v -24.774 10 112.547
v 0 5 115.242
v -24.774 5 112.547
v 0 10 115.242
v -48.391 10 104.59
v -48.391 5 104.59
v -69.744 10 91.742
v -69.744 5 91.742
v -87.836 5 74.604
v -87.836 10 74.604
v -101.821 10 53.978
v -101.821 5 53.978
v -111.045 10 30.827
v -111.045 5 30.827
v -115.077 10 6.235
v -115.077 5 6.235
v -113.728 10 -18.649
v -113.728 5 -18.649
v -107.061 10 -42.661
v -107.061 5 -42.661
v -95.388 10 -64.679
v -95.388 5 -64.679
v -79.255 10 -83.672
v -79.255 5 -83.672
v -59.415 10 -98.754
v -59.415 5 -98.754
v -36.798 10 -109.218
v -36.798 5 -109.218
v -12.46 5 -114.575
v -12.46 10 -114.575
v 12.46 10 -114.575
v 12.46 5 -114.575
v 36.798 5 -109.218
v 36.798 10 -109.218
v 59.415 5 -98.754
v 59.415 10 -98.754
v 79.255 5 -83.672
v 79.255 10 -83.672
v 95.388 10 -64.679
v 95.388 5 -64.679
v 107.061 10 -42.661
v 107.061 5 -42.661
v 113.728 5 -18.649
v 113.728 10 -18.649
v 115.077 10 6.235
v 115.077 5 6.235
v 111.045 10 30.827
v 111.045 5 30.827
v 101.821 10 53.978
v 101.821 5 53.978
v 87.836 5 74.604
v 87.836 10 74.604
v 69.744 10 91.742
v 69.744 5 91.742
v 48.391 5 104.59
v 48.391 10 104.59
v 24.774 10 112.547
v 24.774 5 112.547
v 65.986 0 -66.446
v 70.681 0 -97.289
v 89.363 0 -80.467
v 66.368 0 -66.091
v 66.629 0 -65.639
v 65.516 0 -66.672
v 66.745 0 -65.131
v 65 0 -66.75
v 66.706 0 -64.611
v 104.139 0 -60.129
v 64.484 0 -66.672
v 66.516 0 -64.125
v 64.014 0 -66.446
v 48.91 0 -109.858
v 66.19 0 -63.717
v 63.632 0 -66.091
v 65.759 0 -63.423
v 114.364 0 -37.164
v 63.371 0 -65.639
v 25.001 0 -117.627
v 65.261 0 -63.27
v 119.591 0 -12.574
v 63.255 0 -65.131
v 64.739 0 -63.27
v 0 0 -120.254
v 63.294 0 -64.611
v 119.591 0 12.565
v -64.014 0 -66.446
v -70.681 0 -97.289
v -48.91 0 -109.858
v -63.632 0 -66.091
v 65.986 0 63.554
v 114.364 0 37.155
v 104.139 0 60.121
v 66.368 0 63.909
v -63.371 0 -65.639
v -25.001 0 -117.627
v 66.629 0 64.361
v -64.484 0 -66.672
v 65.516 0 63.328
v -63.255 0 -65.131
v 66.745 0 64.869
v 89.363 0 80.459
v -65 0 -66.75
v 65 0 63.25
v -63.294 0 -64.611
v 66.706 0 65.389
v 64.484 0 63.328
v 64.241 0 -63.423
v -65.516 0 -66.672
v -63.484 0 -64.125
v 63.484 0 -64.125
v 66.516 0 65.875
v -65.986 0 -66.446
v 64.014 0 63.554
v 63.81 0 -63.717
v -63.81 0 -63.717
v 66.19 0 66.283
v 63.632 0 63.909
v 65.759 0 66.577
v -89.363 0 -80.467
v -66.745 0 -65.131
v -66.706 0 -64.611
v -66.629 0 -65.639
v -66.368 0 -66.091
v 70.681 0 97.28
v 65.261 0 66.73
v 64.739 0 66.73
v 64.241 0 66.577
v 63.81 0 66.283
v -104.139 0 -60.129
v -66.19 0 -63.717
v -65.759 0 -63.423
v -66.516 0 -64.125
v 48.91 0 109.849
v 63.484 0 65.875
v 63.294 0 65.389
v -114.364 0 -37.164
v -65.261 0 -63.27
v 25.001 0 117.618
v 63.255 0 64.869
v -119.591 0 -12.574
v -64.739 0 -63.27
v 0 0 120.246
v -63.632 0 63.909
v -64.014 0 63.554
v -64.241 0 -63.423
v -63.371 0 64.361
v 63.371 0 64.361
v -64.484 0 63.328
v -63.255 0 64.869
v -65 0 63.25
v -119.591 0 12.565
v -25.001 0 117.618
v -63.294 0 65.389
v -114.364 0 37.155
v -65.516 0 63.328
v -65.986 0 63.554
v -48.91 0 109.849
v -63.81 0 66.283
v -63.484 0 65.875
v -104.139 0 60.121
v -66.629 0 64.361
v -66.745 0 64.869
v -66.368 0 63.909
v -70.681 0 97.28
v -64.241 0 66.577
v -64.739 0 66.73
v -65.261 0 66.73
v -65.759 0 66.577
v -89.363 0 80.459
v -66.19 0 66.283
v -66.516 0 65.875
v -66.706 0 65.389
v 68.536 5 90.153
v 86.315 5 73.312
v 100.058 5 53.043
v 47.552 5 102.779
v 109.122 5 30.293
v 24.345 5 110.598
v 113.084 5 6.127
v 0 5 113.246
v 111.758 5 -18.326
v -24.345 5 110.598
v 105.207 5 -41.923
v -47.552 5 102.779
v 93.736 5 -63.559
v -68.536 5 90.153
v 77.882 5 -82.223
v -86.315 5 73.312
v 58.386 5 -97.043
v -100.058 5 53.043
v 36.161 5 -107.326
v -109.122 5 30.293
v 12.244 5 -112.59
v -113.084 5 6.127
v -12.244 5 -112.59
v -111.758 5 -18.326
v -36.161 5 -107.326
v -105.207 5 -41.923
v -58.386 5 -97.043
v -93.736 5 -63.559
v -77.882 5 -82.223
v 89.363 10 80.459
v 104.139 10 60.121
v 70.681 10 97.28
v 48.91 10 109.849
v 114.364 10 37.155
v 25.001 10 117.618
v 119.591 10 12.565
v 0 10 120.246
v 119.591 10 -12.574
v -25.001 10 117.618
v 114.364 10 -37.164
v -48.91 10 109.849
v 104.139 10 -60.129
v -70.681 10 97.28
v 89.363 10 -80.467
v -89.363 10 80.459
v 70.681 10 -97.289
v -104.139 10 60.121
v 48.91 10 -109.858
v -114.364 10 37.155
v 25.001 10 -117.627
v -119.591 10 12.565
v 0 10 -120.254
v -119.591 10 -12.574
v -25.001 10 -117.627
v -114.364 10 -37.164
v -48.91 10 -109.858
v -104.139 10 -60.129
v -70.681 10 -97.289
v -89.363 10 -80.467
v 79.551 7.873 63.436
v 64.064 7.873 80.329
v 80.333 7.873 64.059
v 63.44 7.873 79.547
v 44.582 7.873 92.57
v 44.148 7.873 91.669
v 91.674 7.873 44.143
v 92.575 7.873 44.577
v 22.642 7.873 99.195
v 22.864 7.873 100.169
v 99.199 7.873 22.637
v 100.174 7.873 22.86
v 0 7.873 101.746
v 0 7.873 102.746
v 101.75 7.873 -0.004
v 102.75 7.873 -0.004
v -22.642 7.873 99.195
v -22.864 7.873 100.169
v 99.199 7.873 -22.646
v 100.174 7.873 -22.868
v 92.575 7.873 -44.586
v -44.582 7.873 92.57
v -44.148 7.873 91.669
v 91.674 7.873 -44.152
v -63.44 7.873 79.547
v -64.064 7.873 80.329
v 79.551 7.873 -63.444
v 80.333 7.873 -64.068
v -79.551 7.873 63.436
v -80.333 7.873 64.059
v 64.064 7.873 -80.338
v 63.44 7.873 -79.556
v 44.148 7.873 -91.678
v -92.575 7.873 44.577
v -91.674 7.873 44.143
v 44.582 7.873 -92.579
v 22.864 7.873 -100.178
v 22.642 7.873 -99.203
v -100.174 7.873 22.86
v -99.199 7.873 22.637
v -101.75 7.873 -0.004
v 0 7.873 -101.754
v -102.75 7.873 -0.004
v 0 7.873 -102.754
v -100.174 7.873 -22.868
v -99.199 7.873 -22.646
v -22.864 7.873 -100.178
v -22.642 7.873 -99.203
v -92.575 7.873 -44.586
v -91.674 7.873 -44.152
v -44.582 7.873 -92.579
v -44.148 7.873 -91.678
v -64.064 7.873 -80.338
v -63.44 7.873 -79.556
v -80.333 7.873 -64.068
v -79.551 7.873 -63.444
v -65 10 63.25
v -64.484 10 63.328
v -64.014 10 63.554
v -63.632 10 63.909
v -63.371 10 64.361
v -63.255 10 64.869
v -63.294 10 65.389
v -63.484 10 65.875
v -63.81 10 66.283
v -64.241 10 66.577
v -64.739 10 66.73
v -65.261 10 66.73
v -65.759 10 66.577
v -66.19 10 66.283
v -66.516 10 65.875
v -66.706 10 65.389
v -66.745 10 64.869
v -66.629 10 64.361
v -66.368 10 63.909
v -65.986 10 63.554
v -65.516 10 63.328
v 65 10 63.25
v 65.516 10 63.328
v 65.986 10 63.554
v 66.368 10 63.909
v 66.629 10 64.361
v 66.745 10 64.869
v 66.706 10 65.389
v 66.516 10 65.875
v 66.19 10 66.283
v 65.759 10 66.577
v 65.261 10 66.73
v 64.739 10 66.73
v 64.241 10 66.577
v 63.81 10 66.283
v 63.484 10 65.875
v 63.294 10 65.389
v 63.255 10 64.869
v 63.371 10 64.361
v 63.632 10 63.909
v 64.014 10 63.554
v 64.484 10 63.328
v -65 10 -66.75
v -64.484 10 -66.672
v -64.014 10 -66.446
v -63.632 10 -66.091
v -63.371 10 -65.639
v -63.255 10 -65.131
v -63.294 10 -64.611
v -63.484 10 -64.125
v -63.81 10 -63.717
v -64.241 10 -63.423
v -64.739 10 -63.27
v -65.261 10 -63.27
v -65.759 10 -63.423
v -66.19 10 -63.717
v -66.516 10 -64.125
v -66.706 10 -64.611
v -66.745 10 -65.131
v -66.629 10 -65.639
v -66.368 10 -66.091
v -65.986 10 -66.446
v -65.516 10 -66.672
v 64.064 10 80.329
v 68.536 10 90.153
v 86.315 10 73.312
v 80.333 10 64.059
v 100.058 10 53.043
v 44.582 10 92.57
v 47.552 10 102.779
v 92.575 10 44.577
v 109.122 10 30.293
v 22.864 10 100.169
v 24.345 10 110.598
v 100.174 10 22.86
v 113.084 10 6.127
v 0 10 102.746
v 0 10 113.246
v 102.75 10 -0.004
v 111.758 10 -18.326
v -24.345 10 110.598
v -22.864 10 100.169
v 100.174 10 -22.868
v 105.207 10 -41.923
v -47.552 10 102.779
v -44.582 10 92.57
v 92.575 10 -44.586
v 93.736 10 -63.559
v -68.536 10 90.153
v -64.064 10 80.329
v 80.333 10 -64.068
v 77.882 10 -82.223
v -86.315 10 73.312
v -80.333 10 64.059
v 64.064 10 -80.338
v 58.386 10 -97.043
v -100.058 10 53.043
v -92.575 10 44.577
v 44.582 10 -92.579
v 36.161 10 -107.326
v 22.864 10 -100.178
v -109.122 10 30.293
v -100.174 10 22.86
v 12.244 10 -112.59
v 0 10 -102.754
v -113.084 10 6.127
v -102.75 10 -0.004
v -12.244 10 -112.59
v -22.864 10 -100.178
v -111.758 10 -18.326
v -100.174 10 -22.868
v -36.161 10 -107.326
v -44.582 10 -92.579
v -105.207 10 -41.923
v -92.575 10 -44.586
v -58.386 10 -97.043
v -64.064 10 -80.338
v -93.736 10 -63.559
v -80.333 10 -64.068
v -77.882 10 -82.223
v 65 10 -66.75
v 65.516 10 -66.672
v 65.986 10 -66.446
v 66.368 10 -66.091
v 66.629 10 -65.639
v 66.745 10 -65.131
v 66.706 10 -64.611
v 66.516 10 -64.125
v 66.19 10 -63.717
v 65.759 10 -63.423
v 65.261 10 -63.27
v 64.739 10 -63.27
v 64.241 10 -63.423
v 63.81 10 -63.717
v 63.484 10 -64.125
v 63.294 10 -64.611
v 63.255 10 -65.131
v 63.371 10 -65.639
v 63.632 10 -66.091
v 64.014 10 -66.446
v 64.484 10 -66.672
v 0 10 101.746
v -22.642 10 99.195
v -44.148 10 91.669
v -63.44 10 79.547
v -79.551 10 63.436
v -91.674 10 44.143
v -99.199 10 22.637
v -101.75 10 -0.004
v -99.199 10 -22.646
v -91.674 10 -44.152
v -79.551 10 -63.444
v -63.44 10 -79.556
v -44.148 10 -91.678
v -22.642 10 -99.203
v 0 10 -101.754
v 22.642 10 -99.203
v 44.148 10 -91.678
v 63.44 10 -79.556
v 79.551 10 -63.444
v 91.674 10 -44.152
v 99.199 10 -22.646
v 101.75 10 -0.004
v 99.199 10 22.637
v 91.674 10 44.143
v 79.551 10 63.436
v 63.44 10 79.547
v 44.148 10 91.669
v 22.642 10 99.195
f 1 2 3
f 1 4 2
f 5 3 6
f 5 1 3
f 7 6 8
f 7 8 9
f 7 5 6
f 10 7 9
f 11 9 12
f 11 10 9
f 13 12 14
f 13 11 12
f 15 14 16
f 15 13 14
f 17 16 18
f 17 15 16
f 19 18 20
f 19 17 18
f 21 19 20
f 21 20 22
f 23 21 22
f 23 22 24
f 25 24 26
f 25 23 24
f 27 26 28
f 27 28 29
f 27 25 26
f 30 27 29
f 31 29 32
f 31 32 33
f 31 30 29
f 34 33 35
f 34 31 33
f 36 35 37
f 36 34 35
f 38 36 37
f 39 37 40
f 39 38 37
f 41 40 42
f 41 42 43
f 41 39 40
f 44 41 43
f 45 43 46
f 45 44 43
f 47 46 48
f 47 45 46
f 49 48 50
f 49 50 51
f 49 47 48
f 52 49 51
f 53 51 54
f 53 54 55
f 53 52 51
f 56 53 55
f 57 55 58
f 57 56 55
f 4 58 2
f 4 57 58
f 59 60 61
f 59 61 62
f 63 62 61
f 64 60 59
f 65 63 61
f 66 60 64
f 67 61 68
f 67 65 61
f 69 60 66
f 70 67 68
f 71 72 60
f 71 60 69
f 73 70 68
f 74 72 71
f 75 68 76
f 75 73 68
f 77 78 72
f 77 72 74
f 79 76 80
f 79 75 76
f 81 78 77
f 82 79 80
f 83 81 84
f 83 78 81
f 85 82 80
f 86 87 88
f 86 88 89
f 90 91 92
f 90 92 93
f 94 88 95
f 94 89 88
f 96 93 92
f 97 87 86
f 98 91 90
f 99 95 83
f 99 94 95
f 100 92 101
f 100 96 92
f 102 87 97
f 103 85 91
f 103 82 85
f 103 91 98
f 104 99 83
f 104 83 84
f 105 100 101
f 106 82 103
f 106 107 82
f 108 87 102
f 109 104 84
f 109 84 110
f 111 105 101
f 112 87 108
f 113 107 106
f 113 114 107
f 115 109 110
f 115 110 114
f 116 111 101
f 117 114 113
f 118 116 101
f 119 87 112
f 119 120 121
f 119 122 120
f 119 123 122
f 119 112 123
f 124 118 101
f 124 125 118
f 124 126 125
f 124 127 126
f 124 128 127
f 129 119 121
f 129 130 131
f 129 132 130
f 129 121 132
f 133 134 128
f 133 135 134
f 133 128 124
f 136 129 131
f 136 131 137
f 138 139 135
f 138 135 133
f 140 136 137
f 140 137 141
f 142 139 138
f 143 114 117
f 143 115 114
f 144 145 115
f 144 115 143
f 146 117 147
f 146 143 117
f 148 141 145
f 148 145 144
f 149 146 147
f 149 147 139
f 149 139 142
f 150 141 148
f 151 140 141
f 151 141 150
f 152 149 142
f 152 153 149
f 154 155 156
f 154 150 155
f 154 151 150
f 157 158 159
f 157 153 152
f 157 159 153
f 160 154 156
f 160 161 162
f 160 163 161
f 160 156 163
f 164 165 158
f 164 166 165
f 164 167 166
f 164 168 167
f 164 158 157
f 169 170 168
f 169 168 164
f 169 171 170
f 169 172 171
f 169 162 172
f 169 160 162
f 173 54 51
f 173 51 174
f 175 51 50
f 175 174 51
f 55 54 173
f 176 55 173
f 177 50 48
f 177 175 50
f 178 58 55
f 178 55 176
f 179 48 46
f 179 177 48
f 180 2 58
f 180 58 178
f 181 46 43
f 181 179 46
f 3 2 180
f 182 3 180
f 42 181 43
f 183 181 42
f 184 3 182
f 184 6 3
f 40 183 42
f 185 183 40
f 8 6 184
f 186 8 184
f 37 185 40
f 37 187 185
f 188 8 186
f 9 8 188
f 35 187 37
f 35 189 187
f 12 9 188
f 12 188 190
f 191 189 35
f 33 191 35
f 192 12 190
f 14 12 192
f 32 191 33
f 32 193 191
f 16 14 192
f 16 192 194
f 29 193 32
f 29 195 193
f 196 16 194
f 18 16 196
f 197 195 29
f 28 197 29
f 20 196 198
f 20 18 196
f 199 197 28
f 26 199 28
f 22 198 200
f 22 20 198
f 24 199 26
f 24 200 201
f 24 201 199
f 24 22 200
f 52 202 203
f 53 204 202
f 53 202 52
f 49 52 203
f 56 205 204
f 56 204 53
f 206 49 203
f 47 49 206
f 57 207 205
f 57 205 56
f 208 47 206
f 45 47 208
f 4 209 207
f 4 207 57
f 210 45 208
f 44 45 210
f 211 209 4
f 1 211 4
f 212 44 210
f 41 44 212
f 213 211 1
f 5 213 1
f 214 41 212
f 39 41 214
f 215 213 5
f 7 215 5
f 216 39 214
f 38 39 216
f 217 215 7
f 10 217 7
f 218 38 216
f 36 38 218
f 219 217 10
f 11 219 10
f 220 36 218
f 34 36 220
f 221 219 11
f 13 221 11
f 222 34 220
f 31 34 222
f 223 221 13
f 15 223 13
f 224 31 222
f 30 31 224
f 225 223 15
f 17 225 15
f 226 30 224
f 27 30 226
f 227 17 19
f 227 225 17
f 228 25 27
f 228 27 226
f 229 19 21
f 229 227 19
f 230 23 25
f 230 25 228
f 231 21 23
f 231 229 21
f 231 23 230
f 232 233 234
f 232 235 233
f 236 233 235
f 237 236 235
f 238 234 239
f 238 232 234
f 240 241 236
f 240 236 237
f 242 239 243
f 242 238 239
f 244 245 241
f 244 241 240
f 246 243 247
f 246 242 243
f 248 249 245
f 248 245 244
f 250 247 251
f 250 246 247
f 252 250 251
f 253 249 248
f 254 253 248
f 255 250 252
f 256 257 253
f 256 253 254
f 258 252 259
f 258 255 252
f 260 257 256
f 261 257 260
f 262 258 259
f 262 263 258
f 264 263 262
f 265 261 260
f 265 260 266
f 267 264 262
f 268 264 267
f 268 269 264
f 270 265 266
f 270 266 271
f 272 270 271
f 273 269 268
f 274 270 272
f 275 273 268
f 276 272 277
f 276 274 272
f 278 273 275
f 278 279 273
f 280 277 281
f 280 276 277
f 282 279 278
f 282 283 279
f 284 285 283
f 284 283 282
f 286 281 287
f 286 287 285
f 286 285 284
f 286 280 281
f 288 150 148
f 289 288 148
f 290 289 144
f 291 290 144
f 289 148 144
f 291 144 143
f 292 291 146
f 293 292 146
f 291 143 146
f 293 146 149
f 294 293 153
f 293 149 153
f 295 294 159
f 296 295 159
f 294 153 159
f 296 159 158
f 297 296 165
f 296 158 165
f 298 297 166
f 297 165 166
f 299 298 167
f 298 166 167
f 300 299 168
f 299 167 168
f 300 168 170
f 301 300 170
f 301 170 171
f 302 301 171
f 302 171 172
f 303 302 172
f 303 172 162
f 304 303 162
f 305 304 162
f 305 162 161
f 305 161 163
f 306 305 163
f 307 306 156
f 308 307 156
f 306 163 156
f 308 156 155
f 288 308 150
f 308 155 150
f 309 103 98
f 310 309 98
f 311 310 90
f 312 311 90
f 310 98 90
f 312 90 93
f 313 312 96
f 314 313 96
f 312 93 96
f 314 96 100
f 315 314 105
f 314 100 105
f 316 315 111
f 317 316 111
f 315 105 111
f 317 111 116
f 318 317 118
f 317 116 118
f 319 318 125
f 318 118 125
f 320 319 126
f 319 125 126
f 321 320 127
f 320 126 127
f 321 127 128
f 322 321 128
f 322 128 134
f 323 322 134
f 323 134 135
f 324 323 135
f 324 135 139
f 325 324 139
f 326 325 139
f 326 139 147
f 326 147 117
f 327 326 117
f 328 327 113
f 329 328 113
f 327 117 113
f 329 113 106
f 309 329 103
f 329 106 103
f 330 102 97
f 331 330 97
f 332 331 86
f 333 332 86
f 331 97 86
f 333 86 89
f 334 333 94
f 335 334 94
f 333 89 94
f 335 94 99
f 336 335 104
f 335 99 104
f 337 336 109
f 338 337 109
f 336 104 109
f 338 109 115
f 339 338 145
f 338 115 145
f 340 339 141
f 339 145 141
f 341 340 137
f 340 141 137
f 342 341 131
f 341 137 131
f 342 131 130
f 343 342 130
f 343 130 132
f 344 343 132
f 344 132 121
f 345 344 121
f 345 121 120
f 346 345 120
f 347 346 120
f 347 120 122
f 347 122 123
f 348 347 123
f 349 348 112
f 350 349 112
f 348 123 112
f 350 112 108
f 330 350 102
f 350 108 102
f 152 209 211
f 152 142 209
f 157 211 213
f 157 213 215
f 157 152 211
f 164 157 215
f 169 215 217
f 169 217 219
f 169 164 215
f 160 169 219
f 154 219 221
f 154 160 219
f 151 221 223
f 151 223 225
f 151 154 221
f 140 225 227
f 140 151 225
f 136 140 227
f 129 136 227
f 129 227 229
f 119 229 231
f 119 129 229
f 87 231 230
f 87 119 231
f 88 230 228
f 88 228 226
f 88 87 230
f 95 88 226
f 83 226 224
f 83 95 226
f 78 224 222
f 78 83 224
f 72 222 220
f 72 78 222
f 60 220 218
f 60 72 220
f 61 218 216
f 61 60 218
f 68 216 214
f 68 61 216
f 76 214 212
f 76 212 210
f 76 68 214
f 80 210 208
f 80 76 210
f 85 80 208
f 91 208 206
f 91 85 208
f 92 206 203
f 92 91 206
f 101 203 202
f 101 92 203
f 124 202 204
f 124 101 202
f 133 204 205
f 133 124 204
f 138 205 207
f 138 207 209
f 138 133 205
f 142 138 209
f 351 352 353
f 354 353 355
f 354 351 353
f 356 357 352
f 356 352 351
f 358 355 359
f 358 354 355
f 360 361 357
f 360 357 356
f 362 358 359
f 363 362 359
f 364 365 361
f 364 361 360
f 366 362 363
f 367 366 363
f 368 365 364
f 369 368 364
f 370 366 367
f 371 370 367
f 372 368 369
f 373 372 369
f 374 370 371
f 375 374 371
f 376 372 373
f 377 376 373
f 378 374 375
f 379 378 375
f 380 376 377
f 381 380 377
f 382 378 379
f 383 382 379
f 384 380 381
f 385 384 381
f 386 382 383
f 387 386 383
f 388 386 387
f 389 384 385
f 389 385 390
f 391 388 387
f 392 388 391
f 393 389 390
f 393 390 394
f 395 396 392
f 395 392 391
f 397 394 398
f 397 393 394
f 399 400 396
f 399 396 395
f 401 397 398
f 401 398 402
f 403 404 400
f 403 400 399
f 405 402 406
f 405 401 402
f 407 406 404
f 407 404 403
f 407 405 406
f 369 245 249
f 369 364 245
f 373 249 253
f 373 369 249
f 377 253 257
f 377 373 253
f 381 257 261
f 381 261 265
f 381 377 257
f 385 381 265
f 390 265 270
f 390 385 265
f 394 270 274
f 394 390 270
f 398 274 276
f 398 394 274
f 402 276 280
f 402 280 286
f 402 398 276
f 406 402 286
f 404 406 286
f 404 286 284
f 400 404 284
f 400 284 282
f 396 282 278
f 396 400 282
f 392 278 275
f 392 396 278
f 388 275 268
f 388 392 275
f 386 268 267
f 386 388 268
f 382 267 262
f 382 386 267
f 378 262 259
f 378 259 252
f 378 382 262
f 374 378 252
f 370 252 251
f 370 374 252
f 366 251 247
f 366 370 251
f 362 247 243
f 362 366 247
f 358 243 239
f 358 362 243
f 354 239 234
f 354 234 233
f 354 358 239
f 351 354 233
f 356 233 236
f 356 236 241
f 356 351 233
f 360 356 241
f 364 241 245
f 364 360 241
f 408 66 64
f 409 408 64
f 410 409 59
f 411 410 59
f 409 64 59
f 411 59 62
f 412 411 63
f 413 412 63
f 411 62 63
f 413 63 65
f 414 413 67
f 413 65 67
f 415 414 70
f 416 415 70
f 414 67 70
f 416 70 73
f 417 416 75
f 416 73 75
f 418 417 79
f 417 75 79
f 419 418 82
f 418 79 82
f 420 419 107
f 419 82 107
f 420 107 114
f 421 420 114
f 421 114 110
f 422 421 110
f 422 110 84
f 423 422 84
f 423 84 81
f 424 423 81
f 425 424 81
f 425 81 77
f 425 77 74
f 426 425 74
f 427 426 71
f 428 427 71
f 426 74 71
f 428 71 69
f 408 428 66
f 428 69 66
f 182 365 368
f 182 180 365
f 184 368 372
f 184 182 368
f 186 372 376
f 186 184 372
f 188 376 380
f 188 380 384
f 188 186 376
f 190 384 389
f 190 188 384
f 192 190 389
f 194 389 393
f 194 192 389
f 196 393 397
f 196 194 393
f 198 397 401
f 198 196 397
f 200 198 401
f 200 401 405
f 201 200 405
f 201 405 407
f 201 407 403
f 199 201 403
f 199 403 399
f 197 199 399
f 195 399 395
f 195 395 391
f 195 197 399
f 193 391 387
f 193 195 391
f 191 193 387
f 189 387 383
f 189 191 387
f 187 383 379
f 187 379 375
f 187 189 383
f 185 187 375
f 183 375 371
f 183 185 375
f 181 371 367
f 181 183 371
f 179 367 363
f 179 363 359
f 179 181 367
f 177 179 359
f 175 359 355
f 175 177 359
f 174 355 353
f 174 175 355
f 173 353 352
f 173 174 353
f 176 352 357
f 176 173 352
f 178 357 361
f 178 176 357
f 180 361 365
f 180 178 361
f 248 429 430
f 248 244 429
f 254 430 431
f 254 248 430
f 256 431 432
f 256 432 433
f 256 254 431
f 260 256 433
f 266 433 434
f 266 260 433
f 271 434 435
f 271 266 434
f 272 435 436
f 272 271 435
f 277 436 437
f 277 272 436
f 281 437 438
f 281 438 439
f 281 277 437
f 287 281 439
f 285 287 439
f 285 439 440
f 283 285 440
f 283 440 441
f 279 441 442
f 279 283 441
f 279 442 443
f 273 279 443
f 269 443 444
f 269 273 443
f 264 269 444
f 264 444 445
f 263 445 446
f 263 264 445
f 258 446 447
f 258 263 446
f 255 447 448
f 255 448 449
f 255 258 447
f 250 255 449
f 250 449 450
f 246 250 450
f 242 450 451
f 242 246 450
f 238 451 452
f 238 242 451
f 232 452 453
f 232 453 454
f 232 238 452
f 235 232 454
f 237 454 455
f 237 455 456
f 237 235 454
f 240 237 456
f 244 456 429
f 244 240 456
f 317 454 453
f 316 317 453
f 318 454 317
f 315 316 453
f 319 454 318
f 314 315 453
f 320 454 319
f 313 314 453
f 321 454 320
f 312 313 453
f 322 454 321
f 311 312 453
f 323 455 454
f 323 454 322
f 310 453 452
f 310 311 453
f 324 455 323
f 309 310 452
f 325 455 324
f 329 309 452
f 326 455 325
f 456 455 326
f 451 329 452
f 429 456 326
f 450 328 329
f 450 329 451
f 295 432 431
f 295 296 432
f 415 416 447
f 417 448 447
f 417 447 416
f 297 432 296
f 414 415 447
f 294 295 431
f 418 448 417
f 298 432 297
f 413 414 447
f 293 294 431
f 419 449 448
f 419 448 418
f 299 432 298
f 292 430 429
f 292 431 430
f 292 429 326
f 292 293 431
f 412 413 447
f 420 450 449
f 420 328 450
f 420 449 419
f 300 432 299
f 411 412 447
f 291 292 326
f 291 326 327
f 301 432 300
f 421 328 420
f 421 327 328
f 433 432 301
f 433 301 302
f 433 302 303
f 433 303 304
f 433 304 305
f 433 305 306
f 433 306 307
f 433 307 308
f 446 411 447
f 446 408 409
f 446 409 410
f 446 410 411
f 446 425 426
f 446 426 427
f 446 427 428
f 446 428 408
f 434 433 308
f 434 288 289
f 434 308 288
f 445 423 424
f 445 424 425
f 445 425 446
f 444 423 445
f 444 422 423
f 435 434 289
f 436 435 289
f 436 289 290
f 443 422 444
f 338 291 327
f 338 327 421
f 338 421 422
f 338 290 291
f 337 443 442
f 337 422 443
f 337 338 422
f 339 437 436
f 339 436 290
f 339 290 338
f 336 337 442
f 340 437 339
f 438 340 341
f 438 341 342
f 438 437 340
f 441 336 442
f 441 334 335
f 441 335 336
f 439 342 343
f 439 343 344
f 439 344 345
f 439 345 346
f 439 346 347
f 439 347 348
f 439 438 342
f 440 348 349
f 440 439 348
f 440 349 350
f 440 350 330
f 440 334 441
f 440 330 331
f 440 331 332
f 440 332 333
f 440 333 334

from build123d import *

# Parameters (mm, degrees)
ESQUISSE5_R             = 1.75
ENL_V_MAT_EXTRU_3_DEPTH = 10


with BuildPart() as part:
    # Esquisse1 → Révolution1 (revolve)
    with BuildSketch(Plane(origin=(0, 0, 0), x_dir=(0, 0, -1), z_dir=(1, 0, 0)), mode=Mode.PRIVATE) as r_volution1_sk:
        Polygon((101.754375518, 10), (101.754375518, 7.872703136), (102.754375518, 7.872703136), (102.754375518, 10), (113.254375518, 10), (113.254375518, 5), (115.25030387, 5), (115.25030387, 10), (120.254297163, 10), (120.254297163, 0), (0.004375518, 0), (0.004375518, 10), align=None)
    revolve(r_volution1_sk.sketch.rotate(Axis((0, 10, -0.004375518), (0, -1, 0)), 180), axis=Axis((0, 10, -0.004375518), (0, -1, 0)))

    # Esquisse5 → Enlèv. mat.-Extru.3 (cut)
    with BuildSketch(Plane.XZ):
        with Locations(Location((-65, 65, 0), (0, 0, 270))):
            Circle(ESQUISSE5_R)
        with Locations(Location((-65, -65, 0), (0, 0, 270))):
            Circle(ESQUISSE5_R)
        with Locations(Location((65, 65, 0), (0, 0, 270))):
            Circle(ESQUISSE5_R)
        with Locations(Location((65, -65, 0), (0, 0, 270))):
            Circle(ESQUISSE5_R)
    extrude(amount=-ENL_V_MAT_EXTRU_3_DEPTH, mode=Mode.SUBTRACT)


solid = part.part
